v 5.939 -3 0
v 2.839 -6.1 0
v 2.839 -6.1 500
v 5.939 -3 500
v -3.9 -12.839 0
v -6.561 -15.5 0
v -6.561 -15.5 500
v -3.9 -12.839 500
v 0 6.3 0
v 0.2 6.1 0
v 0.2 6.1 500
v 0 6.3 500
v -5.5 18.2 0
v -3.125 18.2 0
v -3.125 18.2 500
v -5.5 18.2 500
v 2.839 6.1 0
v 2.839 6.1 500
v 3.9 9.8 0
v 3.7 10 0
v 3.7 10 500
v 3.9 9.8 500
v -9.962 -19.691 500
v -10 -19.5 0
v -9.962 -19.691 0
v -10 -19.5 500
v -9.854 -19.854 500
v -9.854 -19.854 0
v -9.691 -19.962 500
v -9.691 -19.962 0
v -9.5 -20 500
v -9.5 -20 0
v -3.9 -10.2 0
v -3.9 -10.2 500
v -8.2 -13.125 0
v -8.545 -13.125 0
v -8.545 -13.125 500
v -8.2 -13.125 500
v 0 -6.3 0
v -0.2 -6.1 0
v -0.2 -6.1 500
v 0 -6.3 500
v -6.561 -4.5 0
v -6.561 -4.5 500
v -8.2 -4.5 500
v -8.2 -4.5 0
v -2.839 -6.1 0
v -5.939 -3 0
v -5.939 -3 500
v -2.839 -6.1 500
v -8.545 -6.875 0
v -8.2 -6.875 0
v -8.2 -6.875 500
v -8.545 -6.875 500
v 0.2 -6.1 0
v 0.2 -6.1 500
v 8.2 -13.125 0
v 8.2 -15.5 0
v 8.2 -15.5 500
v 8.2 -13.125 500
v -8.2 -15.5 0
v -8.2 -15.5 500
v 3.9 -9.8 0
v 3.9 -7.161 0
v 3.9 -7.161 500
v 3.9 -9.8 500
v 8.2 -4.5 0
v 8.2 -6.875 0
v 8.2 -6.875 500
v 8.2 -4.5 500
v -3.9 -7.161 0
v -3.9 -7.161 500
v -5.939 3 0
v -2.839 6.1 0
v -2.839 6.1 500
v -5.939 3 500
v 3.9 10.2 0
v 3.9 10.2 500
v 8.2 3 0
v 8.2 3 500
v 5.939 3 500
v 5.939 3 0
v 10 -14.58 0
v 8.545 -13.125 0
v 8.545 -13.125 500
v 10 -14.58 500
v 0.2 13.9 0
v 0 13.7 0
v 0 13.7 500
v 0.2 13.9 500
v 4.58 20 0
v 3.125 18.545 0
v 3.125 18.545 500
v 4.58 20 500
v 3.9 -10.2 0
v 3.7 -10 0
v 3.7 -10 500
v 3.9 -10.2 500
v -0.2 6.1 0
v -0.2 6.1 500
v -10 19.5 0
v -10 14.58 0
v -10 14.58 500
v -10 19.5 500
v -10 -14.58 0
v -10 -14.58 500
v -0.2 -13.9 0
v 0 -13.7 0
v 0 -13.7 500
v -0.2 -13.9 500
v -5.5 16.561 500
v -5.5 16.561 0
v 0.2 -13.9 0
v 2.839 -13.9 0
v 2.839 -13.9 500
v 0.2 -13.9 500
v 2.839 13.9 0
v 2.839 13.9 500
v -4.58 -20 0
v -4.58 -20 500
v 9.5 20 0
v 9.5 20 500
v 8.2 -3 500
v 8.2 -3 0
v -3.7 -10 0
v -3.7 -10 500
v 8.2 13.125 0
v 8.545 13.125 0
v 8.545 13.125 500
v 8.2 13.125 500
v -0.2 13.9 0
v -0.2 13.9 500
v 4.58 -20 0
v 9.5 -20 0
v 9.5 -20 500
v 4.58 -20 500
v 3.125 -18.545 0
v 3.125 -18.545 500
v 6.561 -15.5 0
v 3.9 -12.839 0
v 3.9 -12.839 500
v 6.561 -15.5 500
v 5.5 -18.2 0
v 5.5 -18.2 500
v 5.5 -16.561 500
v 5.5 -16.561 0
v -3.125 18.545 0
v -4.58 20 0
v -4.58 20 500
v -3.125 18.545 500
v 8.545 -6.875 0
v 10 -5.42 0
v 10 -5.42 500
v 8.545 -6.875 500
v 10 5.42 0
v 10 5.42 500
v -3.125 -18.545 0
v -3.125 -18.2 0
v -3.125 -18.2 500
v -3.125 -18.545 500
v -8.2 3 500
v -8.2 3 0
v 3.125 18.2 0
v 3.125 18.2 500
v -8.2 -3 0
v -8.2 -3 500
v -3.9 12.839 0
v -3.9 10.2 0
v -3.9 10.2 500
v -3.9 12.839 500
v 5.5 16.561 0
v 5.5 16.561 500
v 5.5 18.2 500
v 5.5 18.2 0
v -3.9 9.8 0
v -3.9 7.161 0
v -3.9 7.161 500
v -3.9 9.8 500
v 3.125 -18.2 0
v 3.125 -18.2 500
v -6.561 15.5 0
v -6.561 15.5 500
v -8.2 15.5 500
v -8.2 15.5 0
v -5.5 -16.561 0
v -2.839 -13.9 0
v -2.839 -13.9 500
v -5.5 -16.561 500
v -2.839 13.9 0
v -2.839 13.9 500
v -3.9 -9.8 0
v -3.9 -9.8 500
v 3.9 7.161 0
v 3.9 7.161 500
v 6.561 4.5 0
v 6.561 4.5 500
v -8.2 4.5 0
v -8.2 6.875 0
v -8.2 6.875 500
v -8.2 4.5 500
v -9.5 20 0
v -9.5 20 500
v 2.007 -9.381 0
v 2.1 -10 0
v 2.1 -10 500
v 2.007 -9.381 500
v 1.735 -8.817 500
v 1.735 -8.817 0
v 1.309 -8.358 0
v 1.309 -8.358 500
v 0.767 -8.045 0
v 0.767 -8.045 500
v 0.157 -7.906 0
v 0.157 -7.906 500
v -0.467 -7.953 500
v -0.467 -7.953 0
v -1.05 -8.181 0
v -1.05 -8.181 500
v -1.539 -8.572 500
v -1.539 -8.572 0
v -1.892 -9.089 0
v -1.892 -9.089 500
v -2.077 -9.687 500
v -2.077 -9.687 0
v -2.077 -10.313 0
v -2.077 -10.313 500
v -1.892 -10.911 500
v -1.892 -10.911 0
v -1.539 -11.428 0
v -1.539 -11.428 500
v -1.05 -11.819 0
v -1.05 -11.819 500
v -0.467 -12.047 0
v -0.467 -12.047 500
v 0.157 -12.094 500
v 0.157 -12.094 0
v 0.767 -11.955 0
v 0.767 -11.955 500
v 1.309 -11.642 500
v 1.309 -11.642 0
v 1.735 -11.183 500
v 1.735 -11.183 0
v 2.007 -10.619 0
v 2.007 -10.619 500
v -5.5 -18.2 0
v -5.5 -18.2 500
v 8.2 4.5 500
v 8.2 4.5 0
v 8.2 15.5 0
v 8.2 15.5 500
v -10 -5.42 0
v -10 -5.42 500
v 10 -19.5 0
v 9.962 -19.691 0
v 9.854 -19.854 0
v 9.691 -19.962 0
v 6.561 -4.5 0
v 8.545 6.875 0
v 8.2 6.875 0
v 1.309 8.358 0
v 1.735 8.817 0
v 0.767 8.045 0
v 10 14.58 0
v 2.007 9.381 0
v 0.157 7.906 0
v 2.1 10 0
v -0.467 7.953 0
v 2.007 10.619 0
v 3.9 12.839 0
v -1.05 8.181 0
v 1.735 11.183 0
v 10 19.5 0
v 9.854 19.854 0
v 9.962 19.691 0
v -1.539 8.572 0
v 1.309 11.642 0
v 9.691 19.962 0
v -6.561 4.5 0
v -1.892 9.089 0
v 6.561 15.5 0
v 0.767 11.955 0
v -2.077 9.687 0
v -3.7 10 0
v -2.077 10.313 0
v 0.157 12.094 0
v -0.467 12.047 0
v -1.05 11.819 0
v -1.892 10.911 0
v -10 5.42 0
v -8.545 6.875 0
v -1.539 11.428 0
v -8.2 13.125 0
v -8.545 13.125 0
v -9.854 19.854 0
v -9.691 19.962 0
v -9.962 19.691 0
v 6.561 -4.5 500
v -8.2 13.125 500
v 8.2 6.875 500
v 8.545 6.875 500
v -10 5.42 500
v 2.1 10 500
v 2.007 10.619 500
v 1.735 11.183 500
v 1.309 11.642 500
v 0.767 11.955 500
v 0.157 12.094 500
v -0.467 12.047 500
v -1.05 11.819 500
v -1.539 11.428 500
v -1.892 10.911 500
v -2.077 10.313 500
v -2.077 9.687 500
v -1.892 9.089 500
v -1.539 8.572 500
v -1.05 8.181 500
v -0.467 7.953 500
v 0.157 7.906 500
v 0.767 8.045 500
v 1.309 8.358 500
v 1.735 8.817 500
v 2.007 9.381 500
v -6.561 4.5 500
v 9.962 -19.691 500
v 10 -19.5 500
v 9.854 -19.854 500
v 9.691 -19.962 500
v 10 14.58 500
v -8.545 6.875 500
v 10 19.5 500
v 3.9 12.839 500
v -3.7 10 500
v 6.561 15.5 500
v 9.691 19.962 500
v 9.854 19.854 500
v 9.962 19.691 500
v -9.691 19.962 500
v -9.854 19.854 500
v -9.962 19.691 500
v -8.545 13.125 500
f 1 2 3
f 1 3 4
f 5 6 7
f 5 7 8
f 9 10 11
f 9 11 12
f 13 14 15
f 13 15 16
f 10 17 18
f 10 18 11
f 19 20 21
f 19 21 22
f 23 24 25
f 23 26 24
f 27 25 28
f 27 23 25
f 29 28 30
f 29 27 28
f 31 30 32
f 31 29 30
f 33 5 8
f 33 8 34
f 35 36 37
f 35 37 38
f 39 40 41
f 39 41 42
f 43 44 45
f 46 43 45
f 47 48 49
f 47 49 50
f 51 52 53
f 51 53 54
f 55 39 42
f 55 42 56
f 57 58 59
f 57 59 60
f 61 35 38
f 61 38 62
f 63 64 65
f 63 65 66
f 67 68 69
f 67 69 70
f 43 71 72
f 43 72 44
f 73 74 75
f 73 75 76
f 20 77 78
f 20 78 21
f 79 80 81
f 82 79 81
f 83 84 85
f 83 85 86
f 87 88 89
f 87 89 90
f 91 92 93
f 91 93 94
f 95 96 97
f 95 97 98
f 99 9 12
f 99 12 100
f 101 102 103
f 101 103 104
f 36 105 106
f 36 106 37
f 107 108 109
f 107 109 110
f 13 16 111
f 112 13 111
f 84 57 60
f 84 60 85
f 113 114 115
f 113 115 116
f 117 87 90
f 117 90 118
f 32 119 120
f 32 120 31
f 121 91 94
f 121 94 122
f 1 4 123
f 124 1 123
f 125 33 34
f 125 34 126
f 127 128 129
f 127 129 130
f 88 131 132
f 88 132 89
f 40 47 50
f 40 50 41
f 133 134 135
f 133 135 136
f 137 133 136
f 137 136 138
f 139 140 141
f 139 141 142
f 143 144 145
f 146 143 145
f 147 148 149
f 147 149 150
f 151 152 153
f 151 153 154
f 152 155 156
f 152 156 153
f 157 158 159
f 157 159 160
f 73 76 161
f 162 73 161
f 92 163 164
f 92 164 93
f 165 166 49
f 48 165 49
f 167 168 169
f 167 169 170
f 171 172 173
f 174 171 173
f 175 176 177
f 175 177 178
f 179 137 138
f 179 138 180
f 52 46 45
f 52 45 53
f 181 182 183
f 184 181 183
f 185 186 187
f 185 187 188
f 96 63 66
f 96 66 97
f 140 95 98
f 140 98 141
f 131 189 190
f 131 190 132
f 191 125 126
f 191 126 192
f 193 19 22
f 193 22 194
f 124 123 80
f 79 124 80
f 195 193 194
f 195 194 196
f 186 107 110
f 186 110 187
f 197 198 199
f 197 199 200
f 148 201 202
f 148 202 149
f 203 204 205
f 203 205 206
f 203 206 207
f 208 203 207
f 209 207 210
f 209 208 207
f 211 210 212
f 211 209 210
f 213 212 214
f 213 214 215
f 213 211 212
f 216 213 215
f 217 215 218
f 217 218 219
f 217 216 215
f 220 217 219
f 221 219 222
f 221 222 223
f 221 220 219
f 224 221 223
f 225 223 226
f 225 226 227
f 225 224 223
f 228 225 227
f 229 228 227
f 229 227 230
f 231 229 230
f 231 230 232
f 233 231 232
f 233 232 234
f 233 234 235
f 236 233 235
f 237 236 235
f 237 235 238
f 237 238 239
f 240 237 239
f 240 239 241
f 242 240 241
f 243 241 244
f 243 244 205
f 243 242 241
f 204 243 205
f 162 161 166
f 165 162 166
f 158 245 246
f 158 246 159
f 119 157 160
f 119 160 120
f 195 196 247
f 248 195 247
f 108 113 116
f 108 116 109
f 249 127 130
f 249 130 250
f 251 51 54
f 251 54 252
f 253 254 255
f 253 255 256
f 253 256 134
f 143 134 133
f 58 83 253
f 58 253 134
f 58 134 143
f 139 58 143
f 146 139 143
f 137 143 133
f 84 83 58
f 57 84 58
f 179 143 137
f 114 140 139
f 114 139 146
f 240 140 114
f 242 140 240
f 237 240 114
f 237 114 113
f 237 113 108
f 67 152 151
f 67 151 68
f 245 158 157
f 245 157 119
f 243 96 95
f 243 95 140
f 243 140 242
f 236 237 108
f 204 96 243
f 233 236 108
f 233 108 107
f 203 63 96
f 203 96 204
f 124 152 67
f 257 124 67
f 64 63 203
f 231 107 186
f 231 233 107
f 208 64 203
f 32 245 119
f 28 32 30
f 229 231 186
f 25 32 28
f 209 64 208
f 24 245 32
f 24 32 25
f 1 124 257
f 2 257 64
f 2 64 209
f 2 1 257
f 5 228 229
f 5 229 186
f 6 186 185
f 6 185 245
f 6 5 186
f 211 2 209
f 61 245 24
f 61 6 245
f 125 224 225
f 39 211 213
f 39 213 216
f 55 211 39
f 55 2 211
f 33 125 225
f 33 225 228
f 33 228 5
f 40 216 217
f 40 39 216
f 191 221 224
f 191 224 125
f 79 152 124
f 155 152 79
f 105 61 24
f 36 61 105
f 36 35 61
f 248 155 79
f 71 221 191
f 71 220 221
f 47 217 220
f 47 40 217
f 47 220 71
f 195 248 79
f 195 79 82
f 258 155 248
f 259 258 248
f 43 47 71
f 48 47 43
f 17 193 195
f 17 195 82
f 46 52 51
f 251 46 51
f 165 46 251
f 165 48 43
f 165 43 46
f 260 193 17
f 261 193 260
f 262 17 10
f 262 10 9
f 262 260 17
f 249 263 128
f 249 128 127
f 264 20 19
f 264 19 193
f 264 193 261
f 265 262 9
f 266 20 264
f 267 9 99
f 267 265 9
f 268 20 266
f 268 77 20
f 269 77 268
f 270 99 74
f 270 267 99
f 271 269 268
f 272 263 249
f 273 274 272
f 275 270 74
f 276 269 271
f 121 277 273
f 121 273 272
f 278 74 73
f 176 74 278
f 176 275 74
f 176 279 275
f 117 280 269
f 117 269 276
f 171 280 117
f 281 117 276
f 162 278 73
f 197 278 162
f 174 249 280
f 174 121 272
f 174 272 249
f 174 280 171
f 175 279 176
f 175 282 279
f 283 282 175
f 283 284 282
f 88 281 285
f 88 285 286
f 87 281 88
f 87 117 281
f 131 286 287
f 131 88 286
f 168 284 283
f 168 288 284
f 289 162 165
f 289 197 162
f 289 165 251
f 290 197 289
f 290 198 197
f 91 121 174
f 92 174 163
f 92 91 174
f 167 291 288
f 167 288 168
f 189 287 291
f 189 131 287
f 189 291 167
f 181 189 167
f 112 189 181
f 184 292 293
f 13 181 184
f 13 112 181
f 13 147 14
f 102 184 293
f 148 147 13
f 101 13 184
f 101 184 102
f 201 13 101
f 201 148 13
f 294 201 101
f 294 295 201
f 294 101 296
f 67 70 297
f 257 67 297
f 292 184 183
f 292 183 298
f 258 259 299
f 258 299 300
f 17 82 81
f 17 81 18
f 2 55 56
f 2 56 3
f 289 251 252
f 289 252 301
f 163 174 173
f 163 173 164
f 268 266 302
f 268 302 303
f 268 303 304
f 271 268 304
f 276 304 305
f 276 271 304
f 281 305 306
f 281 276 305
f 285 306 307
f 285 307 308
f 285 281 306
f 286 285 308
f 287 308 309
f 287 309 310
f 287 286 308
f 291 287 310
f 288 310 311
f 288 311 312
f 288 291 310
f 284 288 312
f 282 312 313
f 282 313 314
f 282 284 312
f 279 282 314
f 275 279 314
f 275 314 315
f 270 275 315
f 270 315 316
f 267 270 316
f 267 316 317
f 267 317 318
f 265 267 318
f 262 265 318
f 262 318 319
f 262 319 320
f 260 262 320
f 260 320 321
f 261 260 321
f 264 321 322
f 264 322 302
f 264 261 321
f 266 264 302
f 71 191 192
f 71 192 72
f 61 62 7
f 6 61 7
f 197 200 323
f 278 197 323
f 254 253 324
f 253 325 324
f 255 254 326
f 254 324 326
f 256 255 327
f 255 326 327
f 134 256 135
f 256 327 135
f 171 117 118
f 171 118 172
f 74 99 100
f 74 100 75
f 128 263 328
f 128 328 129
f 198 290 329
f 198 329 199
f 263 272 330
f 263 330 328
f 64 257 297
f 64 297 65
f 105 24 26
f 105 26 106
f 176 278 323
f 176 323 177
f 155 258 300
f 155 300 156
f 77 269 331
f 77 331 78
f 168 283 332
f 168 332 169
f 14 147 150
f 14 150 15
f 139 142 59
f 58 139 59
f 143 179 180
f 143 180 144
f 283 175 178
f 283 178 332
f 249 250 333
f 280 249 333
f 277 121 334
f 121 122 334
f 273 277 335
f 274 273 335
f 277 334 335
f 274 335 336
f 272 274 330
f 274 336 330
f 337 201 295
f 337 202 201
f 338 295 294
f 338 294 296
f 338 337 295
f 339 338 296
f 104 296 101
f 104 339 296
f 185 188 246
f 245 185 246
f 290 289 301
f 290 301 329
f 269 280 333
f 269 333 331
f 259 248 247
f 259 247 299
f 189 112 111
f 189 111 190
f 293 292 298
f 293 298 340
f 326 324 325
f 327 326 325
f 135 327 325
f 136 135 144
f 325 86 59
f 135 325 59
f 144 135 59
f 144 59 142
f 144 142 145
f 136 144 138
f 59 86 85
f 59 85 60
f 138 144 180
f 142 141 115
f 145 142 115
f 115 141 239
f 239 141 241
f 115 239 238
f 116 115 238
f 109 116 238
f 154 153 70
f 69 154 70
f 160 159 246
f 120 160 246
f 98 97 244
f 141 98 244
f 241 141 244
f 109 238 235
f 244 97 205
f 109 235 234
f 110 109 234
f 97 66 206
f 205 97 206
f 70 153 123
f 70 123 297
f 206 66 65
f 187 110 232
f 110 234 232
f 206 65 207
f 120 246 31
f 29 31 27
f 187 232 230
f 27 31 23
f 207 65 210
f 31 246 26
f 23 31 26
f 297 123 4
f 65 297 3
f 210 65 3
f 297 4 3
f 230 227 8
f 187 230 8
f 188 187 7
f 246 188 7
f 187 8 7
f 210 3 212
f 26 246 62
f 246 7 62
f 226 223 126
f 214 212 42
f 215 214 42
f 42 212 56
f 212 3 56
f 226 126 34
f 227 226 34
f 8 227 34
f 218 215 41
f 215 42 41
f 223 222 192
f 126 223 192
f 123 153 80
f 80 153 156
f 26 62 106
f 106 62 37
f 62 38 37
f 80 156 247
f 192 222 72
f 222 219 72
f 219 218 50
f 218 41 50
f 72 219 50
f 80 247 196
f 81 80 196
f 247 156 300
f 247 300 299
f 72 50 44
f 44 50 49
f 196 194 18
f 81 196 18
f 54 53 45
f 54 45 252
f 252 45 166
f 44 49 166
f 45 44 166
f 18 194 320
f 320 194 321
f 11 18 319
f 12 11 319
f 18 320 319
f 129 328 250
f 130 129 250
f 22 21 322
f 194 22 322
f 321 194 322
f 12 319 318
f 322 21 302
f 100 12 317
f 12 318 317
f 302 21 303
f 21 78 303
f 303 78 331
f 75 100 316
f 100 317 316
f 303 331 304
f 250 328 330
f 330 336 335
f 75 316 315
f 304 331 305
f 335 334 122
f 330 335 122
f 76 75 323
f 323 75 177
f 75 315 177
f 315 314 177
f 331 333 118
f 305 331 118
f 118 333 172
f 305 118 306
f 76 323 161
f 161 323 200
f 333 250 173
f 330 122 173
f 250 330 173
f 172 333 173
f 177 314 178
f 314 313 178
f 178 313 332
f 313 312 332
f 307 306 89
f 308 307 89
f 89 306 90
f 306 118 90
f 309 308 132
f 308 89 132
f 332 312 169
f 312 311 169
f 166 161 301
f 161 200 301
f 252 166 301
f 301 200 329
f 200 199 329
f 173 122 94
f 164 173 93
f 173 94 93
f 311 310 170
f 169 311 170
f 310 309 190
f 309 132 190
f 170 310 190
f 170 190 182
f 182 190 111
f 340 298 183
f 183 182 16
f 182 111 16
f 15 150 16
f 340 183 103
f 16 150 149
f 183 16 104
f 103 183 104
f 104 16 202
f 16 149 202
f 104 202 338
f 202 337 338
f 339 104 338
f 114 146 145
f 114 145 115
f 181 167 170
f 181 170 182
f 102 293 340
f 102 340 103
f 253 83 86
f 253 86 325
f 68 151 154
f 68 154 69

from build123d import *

# Parameters (mm, degrees)
SKETCH1_R           = 2.1
BOSS_EXTRUDE1_DEPTH = 500
FILLET1_R           = 0.5


with BuildPart() as part:
    # Sketch1 → Boss-Extrude1 (new body)
    with BuildSketch(Plane.XY):
        Polygon((2.839339828, 13.9), (5.5, 16.560660172), (5.5, 18.2), (3.125, 18.2), (3.125, 18.545), (4.58, 20), (10, 20), (10, 14.58), (8.545, 13.125), (8.2, 13.125), (8.2, 15.5), (6.560660172, 15.5), (3.9, 12.839339828), (3.9, 10.2), (3.7, 10), (3.9, 9.8), (3.9, 7.160660172), (6.560660172, 4.5), (8.2, 4.5), (8.2, 6.875), (8.545, 6.875), (10, 5.42), (10, -5.42), (8.545, -6.875), (8.2, -6.875), (8.2, -4.5), (6.560660172, -4.5), (3.9, -7.160660172), (3.9, -9.8), (3.7, -10), (3.9, -10.2), (3.9, -12.839339828), (6.560660172, -15.5), (8.2, -15.5), (8.2, -13.125), (8.545, -13.125), (10, -14.58), (10, -20), (4.58, -20), (3.125, -18.545), (3.125, -18.2), (5.5, -18.2), (5.5, -16.560660172), (2.839339828, -13.9), (0.2, -13.9), (0, -13.7), (-0.2, -13.9), (-2.839339828, -13.9), (-5.5, -16.560660172), (-5.5, -18.2), (-3.125, -18.2), (-3.125, -18.545), (-4.58, -20), (-10, -20), (-10, -14.58), (-8.545, -13.125), (-8.2, -13.125), (-8.2, -15.5), (-6.560660172, -15.5), (-3.9, -12.839339828), (-3.9, -10.2), (-3.7, -10), (-3.9, -9.8), (-3.9, -7.160660172), (-6.560660172, -4.5), (-8.2, -4.5), (-8.2, -6.875), (-8.545, -6.875), (-10, -5.42), (-10, 5.42), (-8.545, 6.875), (-8.2, 6.875), (-8.2, 4.5), (-6.560660172, 4.5), (-3.9, 7.160660172), (-3.9, 9.8), (-3.7, 10), (-3.9, 10.2), (-3.9, 12.839339828), (-6.560660172, 15.5), (-8.2, 15.5), (-8.2, 13.125), (-8.545, 13.125), (-10, 14.58), (-10, 20), (-4.58, 20), (-3.125, 18.545), (-3.125, 18.2), (-5.5, 18.2), (-5.5, 16.560660172), (-2.839339828, 13.9), (-0.2, 13.9), (0, 13.7), (0.2, 13.9), align=None)
        with Locations((0, 10)):
            Circle(SKETCH1_R, mode=Mode.SUBTRACT)
        with Locations((0, -10)):
            Circle(SKETCH1_R, mode=Mode.SUBTRACT)
        Polygon((8.2, -3), (8.2, 3), (5.939339828, 3), (2.839339828, 6.1), (0.2, 6.1), (0, 6.3), (-0.2, 6.1), (-2.839339828, 6.1), (-5.939339828, 3), (-8.2, 3), (-8.2, -3), (-5.939339828, -3), (-2.839339828, -6.1), (-0.2, -6.1), (0, -6.3), (0.2, -6.1), (2.839339828, -6.1), (5.939339828, -3), align=None, mode=Mode.SUBTRACT)
    extrude(amount=BOSS_EXTRUDE1_DEPTH)

    # Fillet1
    fillet1_edges = [part.edges().sort_by_distance(p)[0] for p in [
        (10, -20, 250),
        (-10, -20, 250),
        (-10, 20, 250),
        (10, 20, 250),
    ]]
    fillet(fillet1_edges, radius=FILLET1_R)


solid = part.part
